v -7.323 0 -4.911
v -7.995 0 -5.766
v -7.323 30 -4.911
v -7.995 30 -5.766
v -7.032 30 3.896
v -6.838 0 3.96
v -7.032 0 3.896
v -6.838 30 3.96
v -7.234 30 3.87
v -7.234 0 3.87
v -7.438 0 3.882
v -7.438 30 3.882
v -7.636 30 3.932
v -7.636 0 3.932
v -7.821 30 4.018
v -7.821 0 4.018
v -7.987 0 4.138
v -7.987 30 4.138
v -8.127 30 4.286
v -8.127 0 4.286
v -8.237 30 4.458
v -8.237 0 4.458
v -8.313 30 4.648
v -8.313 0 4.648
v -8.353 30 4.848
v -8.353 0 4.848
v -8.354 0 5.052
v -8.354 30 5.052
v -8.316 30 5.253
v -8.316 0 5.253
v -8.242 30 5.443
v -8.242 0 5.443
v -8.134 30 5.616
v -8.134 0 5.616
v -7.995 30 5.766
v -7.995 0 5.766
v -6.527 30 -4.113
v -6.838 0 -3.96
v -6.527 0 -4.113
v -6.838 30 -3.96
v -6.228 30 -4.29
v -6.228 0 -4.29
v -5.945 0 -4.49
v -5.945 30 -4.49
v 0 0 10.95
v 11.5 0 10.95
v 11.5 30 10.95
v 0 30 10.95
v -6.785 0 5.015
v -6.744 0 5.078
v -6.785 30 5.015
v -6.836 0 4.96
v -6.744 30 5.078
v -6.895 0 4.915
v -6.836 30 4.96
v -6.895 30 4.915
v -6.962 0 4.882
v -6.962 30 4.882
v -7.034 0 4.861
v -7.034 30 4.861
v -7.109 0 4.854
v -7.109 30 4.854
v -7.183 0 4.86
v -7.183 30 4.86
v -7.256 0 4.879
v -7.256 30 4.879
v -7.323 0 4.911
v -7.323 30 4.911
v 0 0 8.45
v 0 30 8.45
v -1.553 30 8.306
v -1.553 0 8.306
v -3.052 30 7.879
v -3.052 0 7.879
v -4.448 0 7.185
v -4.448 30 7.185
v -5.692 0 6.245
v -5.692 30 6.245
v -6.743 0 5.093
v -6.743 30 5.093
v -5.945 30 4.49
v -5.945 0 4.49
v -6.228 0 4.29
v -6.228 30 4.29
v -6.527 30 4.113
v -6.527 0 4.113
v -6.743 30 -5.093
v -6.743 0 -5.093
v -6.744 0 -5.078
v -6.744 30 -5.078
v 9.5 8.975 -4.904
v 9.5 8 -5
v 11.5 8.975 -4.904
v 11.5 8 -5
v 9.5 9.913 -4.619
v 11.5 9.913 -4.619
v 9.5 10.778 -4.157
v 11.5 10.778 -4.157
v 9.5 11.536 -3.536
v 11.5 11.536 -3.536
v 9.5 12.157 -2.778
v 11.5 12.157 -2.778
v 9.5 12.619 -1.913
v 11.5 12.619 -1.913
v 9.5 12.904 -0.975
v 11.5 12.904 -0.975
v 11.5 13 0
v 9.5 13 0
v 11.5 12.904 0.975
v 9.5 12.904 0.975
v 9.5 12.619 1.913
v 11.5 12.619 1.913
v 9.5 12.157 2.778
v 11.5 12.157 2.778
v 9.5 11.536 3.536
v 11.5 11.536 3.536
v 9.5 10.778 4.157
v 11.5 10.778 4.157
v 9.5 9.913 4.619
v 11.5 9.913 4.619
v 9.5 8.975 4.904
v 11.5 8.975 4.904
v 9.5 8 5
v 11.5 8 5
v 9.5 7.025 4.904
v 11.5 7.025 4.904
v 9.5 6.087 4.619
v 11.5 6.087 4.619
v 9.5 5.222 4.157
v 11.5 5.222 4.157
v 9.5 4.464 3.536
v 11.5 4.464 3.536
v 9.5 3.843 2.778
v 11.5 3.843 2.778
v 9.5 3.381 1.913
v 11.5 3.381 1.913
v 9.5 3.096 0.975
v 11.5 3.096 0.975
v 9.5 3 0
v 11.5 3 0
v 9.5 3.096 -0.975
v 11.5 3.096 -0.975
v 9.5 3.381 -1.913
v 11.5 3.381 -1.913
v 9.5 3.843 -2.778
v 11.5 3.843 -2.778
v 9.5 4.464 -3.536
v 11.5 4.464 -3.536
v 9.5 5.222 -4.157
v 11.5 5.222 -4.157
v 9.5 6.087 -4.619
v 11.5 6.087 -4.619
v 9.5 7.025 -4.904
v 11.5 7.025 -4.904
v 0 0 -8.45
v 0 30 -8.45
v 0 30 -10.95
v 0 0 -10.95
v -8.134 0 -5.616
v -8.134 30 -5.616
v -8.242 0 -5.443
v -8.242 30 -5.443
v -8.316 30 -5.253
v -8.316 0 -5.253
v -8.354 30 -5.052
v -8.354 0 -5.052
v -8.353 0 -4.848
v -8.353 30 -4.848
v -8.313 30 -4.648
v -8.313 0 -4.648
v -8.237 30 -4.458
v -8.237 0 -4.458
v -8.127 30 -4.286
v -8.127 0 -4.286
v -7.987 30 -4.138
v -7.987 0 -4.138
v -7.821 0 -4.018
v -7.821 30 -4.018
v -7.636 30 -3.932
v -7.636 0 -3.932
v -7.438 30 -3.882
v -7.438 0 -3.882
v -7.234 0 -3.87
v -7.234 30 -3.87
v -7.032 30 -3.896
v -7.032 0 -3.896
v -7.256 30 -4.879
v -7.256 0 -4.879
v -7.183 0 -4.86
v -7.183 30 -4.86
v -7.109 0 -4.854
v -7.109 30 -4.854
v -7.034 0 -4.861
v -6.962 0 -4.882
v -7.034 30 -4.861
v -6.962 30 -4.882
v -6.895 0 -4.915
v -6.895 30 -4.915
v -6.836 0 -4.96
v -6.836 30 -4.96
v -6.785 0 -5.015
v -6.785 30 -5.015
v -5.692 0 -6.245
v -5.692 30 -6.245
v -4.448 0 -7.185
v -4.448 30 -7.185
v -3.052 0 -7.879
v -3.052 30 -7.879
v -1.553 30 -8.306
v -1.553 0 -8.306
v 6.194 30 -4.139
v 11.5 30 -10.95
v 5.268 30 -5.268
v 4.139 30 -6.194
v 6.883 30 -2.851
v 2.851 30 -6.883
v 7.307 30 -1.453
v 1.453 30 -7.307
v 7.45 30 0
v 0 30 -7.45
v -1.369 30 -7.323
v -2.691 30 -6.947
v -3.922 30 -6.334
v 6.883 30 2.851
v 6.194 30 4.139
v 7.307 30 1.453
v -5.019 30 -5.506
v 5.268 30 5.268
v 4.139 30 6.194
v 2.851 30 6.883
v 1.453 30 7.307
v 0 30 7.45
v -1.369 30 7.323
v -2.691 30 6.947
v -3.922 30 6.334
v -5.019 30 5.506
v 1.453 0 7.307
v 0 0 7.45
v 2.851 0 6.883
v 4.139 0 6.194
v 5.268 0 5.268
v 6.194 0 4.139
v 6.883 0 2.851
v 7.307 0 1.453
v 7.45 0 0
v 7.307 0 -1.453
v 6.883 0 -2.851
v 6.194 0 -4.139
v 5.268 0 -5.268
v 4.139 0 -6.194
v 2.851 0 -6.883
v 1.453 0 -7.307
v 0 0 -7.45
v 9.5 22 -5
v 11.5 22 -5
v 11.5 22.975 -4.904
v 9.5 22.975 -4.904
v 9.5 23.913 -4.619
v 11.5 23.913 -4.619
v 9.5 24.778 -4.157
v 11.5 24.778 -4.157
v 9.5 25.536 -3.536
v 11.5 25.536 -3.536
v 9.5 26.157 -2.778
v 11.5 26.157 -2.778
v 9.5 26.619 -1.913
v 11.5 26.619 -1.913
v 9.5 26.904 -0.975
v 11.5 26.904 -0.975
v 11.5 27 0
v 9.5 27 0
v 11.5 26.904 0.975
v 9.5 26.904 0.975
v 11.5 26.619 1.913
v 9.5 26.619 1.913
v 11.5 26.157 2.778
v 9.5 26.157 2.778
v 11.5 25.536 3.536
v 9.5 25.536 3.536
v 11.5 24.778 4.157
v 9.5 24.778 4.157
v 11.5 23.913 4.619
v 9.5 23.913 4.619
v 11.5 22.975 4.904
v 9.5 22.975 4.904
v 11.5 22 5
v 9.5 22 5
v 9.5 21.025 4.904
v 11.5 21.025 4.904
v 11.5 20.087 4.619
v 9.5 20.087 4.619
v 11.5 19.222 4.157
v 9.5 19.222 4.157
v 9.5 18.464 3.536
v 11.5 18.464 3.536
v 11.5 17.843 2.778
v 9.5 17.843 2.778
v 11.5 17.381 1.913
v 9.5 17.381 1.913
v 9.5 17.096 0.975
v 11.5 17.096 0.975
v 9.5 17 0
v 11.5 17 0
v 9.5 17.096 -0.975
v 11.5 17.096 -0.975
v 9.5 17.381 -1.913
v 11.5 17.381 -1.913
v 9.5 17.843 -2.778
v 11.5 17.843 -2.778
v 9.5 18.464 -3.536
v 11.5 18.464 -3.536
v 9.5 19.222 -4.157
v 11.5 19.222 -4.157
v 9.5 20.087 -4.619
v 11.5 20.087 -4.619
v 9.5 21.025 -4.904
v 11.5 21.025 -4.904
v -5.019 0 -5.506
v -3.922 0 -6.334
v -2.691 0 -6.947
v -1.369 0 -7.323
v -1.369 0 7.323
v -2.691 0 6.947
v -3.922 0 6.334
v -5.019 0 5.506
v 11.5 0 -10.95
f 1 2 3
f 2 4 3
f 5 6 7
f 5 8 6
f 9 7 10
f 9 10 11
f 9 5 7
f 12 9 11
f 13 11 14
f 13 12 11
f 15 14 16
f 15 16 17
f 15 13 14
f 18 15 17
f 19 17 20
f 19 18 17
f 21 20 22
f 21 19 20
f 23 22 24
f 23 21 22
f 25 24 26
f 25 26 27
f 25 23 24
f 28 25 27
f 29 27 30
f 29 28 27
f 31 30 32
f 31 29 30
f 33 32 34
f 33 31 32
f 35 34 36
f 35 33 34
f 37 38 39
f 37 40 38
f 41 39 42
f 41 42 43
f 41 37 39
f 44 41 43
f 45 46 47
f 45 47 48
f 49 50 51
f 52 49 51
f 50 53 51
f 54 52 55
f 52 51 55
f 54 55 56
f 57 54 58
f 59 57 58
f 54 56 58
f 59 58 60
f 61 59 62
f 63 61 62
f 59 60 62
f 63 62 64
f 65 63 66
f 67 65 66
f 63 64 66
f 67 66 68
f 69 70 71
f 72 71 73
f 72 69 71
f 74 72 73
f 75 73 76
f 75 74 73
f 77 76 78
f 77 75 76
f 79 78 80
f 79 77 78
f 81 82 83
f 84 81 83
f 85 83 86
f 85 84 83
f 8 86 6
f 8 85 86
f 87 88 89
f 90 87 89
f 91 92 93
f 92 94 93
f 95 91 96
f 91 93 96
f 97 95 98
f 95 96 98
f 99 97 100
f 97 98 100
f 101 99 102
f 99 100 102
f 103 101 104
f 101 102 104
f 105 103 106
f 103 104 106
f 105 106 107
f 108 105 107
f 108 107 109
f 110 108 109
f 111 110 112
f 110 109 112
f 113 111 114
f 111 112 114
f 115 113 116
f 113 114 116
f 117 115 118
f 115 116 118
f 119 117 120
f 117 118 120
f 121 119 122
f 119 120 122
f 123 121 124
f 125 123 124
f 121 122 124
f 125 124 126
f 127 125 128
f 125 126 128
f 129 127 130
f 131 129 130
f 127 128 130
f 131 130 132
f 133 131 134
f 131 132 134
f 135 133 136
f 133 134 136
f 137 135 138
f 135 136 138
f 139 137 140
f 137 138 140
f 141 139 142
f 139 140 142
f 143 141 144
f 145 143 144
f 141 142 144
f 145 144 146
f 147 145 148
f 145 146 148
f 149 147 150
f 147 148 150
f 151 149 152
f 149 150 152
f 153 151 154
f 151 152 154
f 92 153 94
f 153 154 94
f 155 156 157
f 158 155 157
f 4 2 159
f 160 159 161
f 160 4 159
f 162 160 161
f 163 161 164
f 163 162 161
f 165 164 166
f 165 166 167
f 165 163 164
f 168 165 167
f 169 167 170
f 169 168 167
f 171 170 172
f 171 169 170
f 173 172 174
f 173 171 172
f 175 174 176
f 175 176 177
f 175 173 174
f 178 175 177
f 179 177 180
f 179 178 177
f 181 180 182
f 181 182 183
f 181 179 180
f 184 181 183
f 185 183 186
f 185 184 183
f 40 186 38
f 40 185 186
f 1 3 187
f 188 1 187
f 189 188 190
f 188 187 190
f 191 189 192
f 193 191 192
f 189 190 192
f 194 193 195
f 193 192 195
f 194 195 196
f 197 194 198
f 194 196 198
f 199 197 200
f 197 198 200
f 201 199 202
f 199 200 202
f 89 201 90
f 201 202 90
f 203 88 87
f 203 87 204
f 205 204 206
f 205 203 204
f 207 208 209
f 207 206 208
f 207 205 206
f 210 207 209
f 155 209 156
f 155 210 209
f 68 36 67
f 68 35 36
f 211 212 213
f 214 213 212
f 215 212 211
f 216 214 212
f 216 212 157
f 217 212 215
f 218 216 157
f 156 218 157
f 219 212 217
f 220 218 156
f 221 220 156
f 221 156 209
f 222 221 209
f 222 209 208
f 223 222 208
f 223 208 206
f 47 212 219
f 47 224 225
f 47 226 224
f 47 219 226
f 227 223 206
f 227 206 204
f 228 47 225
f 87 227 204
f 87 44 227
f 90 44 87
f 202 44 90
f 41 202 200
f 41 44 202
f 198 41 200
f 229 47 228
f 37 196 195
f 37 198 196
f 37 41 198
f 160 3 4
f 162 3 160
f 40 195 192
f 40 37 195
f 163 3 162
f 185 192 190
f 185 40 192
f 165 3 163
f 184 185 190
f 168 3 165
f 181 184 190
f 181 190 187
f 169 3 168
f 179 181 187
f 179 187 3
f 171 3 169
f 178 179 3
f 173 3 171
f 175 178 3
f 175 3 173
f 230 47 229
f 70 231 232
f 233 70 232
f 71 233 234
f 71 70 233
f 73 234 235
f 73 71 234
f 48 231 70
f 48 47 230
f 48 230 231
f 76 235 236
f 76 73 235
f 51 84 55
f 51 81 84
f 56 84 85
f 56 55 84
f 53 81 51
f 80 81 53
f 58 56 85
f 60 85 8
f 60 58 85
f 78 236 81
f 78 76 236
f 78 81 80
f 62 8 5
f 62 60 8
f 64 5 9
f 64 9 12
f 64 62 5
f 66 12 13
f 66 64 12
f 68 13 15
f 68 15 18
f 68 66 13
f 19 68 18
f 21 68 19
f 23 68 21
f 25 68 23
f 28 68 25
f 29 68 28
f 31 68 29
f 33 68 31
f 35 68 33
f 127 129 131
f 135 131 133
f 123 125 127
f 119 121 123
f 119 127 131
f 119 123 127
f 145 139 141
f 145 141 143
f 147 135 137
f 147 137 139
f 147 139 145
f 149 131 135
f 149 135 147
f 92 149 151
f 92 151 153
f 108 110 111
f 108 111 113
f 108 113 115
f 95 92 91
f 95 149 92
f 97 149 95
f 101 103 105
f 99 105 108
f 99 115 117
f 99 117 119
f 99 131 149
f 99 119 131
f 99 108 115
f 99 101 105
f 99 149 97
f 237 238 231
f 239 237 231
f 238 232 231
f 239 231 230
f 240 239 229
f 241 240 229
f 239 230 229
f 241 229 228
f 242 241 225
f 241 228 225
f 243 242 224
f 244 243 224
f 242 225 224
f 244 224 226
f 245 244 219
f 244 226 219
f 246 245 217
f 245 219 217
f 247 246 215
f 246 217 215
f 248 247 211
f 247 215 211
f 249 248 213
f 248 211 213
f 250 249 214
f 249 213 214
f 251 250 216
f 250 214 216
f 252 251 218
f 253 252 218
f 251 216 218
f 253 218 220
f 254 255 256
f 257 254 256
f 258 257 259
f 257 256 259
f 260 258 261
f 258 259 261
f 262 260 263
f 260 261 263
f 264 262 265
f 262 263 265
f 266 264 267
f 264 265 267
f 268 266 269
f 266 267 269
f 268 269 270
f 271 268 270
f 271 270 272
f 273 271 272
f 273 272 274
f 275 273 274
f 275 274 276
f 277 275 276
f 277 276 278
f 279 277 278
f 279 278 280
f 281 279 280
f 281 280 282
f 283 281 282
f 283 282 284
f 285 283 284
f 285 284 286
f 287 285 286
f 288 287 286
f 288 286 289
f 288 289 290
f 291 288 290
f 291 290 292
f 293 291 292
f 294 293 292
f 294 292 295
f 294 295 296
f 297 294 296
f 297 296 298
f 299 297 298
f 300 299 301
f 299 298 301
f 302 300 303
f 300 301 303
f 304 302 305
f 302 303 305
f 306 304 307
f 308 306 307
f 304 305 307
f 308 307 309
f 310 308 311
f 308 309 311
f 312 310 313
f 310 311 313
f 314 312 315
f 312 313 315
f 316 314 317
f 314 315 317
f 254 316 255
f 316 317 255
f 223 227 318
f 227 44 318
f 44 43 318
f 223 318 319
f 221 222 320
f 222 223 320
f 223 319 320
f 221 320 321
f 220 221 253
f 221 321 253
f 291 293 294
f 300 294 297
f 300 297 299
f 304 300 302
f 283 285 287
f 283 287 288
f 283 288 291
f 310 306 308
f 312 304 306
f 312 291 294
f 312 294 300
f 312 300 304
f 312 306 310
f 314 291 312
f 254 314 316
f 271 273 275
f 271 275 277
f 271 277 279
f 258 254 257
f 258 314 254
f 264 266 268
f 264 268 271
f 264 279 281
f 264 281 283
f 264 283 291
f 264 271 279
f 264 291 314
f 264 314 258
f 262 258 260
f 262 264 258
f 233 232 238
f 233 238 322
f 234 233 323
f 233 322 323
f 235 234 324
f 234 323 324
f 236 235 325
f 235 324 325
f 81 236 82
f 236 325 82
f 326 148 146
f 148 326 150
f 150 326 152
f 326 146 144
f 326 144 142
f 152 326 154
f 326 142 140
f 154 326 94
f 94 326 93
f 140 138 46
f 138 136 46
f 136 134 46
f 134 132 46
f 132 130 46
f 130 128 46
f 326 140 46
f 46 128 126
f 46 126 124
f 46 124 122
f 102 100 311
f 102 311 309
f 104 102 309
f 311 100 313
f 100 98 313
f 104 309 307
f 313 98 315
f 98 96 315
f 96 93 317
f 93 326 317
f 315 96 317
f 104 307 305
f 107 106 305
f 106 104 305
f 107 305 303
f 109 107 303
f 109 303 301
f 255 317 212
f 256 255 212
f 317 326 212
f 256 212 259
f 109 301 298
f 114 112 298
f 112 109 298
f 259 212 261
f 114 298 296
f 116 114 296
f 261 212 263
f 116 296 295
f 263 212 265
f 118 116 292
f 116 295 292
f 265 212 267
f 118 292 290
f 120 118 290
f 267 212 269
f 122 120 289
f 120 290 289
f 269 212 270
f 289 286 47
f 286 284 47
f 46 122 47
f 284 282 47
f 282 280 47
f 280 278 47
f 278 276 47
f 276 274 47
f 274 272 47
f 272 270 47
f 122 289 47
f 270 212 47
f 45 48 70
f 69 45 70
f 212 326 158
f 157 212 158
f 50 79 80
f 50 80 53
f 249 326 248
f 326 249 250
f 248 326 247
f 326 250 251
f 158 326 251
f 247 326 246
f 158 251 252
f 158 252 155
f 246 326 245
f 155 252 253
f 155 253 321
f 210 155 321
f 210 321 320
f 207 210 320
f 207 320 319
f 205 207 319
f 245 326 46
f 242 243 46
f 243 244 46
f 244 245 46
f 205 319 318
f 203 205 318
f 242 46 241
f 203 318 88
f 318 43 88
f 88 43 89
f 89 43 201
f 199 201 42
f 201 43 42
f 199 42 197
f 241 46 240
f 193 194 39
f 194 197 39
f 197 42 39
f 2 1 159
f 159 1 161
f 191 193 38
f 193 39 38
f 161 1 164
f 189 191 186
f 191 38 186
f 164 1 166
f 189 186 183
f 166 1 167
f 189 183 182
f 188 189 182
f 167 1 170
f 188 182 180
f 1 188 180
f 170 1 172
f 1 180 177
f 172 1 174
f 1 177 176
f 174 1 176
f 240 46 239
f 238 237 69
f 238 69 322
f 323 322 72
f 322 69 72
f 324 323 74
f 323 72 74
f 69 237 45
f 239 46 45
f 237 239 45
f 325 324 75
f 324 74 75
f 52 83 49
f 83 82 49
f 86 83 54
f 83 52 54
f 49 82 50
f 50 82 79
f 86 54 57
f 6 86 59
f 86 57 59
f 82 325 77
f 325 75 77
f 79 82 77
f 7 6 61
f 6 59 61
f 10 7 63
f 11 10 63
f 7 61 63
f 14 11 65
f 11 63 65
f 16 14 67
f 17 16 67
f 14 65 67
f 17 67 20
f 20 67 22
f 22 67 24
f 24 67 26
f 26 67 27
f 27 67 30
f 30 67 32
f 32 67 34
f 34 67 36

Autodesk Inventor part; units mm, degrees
ref_plane "YZ Plane" through (0, 0, 0) normal (1, 0, 0) x (0, 1, 0)
ref_plane "XZ Plane" through (0, 0, 0) normal (0, 1, 0) x (-1, 0, 0)
ref_plane "XY Plane" through (0, 0, 0) normal (0, 0, 1) x (1, 0, 0)
sketch "Эскиз1" plane through (0, 0, 0) normal (0, 1, 0) x (-1, 0, 0)
  circle A0 centre (0, 0) radius 7.45
  circle A1 centre (0, 0) radius 8.45
  line L0 (0, 0) -> (6.7429, 5.0927)
  line L1 (0, 0) -> (6.7429, -5.0927)
  point P0 (5.9449, -4.49)
  point P1 (5.9449, 4.49)
  dimension "d0" = 14.9
  dimension "d1" = 16.9
extrude "Выдавливание1" add sketch "Эскиз1" along normal blind 30 contours A0 L1 A1 L0 picked at (-7.9526, 1.3085)
sketch "Эскиз2" plane through (0, 30, 0) normal (0, 1, 0) x (1, 0, 0)
  arc A0 (-5.9449, -4.49) -> (-6.8376, -3.9601) centre (-8.6463, -8.0239) ccw
  arc A1 (-6.8376, -3.9601) -> (-7.9946, -5.7659) centre (-7.272, -4.9553) ccw
  line L0 (-7.9946, -5.7659) -> (-7.3233, -4.9114)
  arc A2 (-6.7444, -5.0781) -> (-7.3233, -4.9114) centre (-7.1127, -5.2686) ccw
  line L1 (-5.9449, -4.49) -> (-6.7429, -5.0927)
  line L2 (-6.7429, -5.0927) -> (-5.9449, -4.49)
  line L3 (-6.7429, -5.0927) -> (-6.7444, -5.0781)
  line L4 (-0.0151, 0) -> (-3.489, 0)
  arc A3 (-6.8376, 3.9601) -> (-5.9449, 4.49) centre (-8.6463, 8.0239) ccw
  arc A4 (-7.3233, 4.9114) -> (-6.7444, 5.0781) centre (-7.1127, 5.2686) ccw
  line L5 (-5.9449, 4.49) -> (-6.7429, 5.0927)
  line L6 (-6.7429, 5.0927) -> (-5.9449, 4.49)
  line L7 (-6.7429, 5.0927) -> (-6.7444, 5.0781)
  arc A5 (-7.9946, 5.7659) -> (-6.8376, 3.9601) centre (-7.272, 4.9553) ccw
  line L8 (-7.9946, 5.7659) -> (-7.3233, 4.9114)
  point P0 (-5.9449, 4.49)
  point P1 (-6.7429, -5.0927)
  point P2 (-5.3694, -4.0591)
  point P3 (-6.7429, 5.0927)
  point P4 (-5.3694, 4.0591)
  point P5 (-6.7429, 5.0927)
  dimension "d25" = 1.0859
sketch "Эскиз3" plane through (0, 30, 0) normal (0, 1, 0) x (1, 0, 0)
  arc A0 (-6.7429, -5.0927) -> (-6.7429, 5.0927) centre (0, 0) ccw projected
  line L0 (11.5, -6.95) -> (11.5, 6.95)
  arc A1 (-5.9449, -4.49) -> (-5.9449, 4.49) centre (0, 0) ccw projected
  line L1 (0, -8.45) -> (0, -7.45)
  line L2 (0, 7.45) -> (0, 8.45)
  line L3 (11.5, 6.95) -> (11.5, 10.95)
  line L4 (11.5, -6.95) -> (11.5, -10.95)
  line L5 (0, 3.95) -> (0, 8.45)
  line L6 (11.5, -10.95) -> (0, -10.95)
  line L7 (0, -10.95) -> (0, -8.45)
  line L8 (11.5, 10.95) -> (0, 10.95)
  line L9 (0, 10.95) -> (0, 8.45)
  arc A2 (0, -7.45) -> (0, 7.45) centre (0, 0) ccw
  dimension "d13" = 4
  dimension "d14" = 4
  dimension "d22" = 21.9
  dimension "d23" = 3.5
extrude "Выдавливание3" add sketch "Эскиз3" against normal blind 30
ref_plane "РабПлоскость1" through (11.5, 20, 4.95) normal (1, 0, 0) x (0, 0, -1)
sketch "Эскиз4" plane through (11.5, 20, 4.95) normal (1, 0, 0) x (0, 0, -1)
  line L0 (4.95, -20) -> (4.95, 10)
  line L1 (1, 10) -> (8.9, 10) projected
  circle A0 centre (4.95, -12) radius 5
  line L2 (14.4, -20) -> (-4.5, -20) projected
  circle A1 centre (4.95, 2) radius 5
  line L3 (-4.5, 10) -> (14.4, 10) projected
  point P0 (7.3306, 10)
  point P1 (2.5694, 10)
  point P2 (4.95, 10)
  dimension "d15" = 10
  dimension "d16" = 8
  dimension "d17" = 10
  dimension "d18" = 8
extrude "Выдавливание4" cut sketch "Эскиз4" against normal blind 2
extrude "Выдавливание5" add sketch "Эскиз2" against normal blind 30
sketch "Эскиз5" plane through (0, 30, 0) normal (0, 1, 0) x (1, 0, 0)
  arc A0 (0, 8.45) -> (-6.7429, 5.0927) centre (0, 0) ccw projected
  line L0 (-6.7429, 5.0927) -> (-6.7444, 5.0781) projected
  arc A1 (-7.3233, 4.9114) -> (-6.7444, 5.0781) centre (-7.1127, 5.2686) ccw projected
  line L1 (-7.3233, 4.9114) -> (-7.9946, 5.7659) projected
  arc A2 (-7.9946, 5.7659) -> (-6.8376, 3.9601) centre (-7.272, 4.9553) ccw projected
  arc A3 (-6.8376, 3.9601) -> (-5.9449, 4.49) centre (-8.6463, 8.0239) ccw projected
  arc A4 (-5.9449, -4.49) -> (-5.9449, 4.49) centre (0, 0) ccw projected
  arc A5 (-5.9449, -4.49) -> (-6.8376, -3.9601) centre (-8.6463, -8.0239) ccw projected
  arc A6 (-6.8376, -3.9601) -> (-7.9946, -5.7659) centre (-7.272, -4.9553) ccw projected
  line L2 (-7.9946, -5.7659) -> (-7.3233, -4.9114) projected
  arc A7 (-6.7444, -5.0781) -> (-7.3233, -4.9114) centre (-7.1127, -5.2686) ccw projected
  line L3 (-6.7444, -5.0781) -> (-6.7429, -5.0927) projected
  arc A8 (-6.7429, -5.0927) -> (0, -8.45) centre (0, 0) ccw projected
  line L4 (0, -8.45) -> (0, -10.95) projected
  line L5 (0, -10.95) -> (11.5, -10.95) projected
  line L6 (11.5, -10.95) -> (11.5, 10.95) projected
  line L7 (11.5, 10.95) -> (0, 10.95) projected
  line L8 (0, 10.95) -> (0, 8.45) projected
  line L9 (0, 7.45) -> (0, 8.45)
  line L10 (0, -7.45) -> (0, -8.45)
extrude "Выдавливание6" [suppressed]
sketch "Эскиз6" plane through (11.5, 30, 10.95) normal (1, 0, 0) x (0, 0, -1)
  arc A0 (15.95, -22) -> (15.95, -22) centre (10.95, -22) ccw projected
  arc A1 (15.95, -8) -> (15.95, -8) centre (10.95, -8) ccw projected
  point P0 (10.95, -30)
extrude "Выдавливание7" [suppressed]
properties part number "крепление маркера 15мм"
